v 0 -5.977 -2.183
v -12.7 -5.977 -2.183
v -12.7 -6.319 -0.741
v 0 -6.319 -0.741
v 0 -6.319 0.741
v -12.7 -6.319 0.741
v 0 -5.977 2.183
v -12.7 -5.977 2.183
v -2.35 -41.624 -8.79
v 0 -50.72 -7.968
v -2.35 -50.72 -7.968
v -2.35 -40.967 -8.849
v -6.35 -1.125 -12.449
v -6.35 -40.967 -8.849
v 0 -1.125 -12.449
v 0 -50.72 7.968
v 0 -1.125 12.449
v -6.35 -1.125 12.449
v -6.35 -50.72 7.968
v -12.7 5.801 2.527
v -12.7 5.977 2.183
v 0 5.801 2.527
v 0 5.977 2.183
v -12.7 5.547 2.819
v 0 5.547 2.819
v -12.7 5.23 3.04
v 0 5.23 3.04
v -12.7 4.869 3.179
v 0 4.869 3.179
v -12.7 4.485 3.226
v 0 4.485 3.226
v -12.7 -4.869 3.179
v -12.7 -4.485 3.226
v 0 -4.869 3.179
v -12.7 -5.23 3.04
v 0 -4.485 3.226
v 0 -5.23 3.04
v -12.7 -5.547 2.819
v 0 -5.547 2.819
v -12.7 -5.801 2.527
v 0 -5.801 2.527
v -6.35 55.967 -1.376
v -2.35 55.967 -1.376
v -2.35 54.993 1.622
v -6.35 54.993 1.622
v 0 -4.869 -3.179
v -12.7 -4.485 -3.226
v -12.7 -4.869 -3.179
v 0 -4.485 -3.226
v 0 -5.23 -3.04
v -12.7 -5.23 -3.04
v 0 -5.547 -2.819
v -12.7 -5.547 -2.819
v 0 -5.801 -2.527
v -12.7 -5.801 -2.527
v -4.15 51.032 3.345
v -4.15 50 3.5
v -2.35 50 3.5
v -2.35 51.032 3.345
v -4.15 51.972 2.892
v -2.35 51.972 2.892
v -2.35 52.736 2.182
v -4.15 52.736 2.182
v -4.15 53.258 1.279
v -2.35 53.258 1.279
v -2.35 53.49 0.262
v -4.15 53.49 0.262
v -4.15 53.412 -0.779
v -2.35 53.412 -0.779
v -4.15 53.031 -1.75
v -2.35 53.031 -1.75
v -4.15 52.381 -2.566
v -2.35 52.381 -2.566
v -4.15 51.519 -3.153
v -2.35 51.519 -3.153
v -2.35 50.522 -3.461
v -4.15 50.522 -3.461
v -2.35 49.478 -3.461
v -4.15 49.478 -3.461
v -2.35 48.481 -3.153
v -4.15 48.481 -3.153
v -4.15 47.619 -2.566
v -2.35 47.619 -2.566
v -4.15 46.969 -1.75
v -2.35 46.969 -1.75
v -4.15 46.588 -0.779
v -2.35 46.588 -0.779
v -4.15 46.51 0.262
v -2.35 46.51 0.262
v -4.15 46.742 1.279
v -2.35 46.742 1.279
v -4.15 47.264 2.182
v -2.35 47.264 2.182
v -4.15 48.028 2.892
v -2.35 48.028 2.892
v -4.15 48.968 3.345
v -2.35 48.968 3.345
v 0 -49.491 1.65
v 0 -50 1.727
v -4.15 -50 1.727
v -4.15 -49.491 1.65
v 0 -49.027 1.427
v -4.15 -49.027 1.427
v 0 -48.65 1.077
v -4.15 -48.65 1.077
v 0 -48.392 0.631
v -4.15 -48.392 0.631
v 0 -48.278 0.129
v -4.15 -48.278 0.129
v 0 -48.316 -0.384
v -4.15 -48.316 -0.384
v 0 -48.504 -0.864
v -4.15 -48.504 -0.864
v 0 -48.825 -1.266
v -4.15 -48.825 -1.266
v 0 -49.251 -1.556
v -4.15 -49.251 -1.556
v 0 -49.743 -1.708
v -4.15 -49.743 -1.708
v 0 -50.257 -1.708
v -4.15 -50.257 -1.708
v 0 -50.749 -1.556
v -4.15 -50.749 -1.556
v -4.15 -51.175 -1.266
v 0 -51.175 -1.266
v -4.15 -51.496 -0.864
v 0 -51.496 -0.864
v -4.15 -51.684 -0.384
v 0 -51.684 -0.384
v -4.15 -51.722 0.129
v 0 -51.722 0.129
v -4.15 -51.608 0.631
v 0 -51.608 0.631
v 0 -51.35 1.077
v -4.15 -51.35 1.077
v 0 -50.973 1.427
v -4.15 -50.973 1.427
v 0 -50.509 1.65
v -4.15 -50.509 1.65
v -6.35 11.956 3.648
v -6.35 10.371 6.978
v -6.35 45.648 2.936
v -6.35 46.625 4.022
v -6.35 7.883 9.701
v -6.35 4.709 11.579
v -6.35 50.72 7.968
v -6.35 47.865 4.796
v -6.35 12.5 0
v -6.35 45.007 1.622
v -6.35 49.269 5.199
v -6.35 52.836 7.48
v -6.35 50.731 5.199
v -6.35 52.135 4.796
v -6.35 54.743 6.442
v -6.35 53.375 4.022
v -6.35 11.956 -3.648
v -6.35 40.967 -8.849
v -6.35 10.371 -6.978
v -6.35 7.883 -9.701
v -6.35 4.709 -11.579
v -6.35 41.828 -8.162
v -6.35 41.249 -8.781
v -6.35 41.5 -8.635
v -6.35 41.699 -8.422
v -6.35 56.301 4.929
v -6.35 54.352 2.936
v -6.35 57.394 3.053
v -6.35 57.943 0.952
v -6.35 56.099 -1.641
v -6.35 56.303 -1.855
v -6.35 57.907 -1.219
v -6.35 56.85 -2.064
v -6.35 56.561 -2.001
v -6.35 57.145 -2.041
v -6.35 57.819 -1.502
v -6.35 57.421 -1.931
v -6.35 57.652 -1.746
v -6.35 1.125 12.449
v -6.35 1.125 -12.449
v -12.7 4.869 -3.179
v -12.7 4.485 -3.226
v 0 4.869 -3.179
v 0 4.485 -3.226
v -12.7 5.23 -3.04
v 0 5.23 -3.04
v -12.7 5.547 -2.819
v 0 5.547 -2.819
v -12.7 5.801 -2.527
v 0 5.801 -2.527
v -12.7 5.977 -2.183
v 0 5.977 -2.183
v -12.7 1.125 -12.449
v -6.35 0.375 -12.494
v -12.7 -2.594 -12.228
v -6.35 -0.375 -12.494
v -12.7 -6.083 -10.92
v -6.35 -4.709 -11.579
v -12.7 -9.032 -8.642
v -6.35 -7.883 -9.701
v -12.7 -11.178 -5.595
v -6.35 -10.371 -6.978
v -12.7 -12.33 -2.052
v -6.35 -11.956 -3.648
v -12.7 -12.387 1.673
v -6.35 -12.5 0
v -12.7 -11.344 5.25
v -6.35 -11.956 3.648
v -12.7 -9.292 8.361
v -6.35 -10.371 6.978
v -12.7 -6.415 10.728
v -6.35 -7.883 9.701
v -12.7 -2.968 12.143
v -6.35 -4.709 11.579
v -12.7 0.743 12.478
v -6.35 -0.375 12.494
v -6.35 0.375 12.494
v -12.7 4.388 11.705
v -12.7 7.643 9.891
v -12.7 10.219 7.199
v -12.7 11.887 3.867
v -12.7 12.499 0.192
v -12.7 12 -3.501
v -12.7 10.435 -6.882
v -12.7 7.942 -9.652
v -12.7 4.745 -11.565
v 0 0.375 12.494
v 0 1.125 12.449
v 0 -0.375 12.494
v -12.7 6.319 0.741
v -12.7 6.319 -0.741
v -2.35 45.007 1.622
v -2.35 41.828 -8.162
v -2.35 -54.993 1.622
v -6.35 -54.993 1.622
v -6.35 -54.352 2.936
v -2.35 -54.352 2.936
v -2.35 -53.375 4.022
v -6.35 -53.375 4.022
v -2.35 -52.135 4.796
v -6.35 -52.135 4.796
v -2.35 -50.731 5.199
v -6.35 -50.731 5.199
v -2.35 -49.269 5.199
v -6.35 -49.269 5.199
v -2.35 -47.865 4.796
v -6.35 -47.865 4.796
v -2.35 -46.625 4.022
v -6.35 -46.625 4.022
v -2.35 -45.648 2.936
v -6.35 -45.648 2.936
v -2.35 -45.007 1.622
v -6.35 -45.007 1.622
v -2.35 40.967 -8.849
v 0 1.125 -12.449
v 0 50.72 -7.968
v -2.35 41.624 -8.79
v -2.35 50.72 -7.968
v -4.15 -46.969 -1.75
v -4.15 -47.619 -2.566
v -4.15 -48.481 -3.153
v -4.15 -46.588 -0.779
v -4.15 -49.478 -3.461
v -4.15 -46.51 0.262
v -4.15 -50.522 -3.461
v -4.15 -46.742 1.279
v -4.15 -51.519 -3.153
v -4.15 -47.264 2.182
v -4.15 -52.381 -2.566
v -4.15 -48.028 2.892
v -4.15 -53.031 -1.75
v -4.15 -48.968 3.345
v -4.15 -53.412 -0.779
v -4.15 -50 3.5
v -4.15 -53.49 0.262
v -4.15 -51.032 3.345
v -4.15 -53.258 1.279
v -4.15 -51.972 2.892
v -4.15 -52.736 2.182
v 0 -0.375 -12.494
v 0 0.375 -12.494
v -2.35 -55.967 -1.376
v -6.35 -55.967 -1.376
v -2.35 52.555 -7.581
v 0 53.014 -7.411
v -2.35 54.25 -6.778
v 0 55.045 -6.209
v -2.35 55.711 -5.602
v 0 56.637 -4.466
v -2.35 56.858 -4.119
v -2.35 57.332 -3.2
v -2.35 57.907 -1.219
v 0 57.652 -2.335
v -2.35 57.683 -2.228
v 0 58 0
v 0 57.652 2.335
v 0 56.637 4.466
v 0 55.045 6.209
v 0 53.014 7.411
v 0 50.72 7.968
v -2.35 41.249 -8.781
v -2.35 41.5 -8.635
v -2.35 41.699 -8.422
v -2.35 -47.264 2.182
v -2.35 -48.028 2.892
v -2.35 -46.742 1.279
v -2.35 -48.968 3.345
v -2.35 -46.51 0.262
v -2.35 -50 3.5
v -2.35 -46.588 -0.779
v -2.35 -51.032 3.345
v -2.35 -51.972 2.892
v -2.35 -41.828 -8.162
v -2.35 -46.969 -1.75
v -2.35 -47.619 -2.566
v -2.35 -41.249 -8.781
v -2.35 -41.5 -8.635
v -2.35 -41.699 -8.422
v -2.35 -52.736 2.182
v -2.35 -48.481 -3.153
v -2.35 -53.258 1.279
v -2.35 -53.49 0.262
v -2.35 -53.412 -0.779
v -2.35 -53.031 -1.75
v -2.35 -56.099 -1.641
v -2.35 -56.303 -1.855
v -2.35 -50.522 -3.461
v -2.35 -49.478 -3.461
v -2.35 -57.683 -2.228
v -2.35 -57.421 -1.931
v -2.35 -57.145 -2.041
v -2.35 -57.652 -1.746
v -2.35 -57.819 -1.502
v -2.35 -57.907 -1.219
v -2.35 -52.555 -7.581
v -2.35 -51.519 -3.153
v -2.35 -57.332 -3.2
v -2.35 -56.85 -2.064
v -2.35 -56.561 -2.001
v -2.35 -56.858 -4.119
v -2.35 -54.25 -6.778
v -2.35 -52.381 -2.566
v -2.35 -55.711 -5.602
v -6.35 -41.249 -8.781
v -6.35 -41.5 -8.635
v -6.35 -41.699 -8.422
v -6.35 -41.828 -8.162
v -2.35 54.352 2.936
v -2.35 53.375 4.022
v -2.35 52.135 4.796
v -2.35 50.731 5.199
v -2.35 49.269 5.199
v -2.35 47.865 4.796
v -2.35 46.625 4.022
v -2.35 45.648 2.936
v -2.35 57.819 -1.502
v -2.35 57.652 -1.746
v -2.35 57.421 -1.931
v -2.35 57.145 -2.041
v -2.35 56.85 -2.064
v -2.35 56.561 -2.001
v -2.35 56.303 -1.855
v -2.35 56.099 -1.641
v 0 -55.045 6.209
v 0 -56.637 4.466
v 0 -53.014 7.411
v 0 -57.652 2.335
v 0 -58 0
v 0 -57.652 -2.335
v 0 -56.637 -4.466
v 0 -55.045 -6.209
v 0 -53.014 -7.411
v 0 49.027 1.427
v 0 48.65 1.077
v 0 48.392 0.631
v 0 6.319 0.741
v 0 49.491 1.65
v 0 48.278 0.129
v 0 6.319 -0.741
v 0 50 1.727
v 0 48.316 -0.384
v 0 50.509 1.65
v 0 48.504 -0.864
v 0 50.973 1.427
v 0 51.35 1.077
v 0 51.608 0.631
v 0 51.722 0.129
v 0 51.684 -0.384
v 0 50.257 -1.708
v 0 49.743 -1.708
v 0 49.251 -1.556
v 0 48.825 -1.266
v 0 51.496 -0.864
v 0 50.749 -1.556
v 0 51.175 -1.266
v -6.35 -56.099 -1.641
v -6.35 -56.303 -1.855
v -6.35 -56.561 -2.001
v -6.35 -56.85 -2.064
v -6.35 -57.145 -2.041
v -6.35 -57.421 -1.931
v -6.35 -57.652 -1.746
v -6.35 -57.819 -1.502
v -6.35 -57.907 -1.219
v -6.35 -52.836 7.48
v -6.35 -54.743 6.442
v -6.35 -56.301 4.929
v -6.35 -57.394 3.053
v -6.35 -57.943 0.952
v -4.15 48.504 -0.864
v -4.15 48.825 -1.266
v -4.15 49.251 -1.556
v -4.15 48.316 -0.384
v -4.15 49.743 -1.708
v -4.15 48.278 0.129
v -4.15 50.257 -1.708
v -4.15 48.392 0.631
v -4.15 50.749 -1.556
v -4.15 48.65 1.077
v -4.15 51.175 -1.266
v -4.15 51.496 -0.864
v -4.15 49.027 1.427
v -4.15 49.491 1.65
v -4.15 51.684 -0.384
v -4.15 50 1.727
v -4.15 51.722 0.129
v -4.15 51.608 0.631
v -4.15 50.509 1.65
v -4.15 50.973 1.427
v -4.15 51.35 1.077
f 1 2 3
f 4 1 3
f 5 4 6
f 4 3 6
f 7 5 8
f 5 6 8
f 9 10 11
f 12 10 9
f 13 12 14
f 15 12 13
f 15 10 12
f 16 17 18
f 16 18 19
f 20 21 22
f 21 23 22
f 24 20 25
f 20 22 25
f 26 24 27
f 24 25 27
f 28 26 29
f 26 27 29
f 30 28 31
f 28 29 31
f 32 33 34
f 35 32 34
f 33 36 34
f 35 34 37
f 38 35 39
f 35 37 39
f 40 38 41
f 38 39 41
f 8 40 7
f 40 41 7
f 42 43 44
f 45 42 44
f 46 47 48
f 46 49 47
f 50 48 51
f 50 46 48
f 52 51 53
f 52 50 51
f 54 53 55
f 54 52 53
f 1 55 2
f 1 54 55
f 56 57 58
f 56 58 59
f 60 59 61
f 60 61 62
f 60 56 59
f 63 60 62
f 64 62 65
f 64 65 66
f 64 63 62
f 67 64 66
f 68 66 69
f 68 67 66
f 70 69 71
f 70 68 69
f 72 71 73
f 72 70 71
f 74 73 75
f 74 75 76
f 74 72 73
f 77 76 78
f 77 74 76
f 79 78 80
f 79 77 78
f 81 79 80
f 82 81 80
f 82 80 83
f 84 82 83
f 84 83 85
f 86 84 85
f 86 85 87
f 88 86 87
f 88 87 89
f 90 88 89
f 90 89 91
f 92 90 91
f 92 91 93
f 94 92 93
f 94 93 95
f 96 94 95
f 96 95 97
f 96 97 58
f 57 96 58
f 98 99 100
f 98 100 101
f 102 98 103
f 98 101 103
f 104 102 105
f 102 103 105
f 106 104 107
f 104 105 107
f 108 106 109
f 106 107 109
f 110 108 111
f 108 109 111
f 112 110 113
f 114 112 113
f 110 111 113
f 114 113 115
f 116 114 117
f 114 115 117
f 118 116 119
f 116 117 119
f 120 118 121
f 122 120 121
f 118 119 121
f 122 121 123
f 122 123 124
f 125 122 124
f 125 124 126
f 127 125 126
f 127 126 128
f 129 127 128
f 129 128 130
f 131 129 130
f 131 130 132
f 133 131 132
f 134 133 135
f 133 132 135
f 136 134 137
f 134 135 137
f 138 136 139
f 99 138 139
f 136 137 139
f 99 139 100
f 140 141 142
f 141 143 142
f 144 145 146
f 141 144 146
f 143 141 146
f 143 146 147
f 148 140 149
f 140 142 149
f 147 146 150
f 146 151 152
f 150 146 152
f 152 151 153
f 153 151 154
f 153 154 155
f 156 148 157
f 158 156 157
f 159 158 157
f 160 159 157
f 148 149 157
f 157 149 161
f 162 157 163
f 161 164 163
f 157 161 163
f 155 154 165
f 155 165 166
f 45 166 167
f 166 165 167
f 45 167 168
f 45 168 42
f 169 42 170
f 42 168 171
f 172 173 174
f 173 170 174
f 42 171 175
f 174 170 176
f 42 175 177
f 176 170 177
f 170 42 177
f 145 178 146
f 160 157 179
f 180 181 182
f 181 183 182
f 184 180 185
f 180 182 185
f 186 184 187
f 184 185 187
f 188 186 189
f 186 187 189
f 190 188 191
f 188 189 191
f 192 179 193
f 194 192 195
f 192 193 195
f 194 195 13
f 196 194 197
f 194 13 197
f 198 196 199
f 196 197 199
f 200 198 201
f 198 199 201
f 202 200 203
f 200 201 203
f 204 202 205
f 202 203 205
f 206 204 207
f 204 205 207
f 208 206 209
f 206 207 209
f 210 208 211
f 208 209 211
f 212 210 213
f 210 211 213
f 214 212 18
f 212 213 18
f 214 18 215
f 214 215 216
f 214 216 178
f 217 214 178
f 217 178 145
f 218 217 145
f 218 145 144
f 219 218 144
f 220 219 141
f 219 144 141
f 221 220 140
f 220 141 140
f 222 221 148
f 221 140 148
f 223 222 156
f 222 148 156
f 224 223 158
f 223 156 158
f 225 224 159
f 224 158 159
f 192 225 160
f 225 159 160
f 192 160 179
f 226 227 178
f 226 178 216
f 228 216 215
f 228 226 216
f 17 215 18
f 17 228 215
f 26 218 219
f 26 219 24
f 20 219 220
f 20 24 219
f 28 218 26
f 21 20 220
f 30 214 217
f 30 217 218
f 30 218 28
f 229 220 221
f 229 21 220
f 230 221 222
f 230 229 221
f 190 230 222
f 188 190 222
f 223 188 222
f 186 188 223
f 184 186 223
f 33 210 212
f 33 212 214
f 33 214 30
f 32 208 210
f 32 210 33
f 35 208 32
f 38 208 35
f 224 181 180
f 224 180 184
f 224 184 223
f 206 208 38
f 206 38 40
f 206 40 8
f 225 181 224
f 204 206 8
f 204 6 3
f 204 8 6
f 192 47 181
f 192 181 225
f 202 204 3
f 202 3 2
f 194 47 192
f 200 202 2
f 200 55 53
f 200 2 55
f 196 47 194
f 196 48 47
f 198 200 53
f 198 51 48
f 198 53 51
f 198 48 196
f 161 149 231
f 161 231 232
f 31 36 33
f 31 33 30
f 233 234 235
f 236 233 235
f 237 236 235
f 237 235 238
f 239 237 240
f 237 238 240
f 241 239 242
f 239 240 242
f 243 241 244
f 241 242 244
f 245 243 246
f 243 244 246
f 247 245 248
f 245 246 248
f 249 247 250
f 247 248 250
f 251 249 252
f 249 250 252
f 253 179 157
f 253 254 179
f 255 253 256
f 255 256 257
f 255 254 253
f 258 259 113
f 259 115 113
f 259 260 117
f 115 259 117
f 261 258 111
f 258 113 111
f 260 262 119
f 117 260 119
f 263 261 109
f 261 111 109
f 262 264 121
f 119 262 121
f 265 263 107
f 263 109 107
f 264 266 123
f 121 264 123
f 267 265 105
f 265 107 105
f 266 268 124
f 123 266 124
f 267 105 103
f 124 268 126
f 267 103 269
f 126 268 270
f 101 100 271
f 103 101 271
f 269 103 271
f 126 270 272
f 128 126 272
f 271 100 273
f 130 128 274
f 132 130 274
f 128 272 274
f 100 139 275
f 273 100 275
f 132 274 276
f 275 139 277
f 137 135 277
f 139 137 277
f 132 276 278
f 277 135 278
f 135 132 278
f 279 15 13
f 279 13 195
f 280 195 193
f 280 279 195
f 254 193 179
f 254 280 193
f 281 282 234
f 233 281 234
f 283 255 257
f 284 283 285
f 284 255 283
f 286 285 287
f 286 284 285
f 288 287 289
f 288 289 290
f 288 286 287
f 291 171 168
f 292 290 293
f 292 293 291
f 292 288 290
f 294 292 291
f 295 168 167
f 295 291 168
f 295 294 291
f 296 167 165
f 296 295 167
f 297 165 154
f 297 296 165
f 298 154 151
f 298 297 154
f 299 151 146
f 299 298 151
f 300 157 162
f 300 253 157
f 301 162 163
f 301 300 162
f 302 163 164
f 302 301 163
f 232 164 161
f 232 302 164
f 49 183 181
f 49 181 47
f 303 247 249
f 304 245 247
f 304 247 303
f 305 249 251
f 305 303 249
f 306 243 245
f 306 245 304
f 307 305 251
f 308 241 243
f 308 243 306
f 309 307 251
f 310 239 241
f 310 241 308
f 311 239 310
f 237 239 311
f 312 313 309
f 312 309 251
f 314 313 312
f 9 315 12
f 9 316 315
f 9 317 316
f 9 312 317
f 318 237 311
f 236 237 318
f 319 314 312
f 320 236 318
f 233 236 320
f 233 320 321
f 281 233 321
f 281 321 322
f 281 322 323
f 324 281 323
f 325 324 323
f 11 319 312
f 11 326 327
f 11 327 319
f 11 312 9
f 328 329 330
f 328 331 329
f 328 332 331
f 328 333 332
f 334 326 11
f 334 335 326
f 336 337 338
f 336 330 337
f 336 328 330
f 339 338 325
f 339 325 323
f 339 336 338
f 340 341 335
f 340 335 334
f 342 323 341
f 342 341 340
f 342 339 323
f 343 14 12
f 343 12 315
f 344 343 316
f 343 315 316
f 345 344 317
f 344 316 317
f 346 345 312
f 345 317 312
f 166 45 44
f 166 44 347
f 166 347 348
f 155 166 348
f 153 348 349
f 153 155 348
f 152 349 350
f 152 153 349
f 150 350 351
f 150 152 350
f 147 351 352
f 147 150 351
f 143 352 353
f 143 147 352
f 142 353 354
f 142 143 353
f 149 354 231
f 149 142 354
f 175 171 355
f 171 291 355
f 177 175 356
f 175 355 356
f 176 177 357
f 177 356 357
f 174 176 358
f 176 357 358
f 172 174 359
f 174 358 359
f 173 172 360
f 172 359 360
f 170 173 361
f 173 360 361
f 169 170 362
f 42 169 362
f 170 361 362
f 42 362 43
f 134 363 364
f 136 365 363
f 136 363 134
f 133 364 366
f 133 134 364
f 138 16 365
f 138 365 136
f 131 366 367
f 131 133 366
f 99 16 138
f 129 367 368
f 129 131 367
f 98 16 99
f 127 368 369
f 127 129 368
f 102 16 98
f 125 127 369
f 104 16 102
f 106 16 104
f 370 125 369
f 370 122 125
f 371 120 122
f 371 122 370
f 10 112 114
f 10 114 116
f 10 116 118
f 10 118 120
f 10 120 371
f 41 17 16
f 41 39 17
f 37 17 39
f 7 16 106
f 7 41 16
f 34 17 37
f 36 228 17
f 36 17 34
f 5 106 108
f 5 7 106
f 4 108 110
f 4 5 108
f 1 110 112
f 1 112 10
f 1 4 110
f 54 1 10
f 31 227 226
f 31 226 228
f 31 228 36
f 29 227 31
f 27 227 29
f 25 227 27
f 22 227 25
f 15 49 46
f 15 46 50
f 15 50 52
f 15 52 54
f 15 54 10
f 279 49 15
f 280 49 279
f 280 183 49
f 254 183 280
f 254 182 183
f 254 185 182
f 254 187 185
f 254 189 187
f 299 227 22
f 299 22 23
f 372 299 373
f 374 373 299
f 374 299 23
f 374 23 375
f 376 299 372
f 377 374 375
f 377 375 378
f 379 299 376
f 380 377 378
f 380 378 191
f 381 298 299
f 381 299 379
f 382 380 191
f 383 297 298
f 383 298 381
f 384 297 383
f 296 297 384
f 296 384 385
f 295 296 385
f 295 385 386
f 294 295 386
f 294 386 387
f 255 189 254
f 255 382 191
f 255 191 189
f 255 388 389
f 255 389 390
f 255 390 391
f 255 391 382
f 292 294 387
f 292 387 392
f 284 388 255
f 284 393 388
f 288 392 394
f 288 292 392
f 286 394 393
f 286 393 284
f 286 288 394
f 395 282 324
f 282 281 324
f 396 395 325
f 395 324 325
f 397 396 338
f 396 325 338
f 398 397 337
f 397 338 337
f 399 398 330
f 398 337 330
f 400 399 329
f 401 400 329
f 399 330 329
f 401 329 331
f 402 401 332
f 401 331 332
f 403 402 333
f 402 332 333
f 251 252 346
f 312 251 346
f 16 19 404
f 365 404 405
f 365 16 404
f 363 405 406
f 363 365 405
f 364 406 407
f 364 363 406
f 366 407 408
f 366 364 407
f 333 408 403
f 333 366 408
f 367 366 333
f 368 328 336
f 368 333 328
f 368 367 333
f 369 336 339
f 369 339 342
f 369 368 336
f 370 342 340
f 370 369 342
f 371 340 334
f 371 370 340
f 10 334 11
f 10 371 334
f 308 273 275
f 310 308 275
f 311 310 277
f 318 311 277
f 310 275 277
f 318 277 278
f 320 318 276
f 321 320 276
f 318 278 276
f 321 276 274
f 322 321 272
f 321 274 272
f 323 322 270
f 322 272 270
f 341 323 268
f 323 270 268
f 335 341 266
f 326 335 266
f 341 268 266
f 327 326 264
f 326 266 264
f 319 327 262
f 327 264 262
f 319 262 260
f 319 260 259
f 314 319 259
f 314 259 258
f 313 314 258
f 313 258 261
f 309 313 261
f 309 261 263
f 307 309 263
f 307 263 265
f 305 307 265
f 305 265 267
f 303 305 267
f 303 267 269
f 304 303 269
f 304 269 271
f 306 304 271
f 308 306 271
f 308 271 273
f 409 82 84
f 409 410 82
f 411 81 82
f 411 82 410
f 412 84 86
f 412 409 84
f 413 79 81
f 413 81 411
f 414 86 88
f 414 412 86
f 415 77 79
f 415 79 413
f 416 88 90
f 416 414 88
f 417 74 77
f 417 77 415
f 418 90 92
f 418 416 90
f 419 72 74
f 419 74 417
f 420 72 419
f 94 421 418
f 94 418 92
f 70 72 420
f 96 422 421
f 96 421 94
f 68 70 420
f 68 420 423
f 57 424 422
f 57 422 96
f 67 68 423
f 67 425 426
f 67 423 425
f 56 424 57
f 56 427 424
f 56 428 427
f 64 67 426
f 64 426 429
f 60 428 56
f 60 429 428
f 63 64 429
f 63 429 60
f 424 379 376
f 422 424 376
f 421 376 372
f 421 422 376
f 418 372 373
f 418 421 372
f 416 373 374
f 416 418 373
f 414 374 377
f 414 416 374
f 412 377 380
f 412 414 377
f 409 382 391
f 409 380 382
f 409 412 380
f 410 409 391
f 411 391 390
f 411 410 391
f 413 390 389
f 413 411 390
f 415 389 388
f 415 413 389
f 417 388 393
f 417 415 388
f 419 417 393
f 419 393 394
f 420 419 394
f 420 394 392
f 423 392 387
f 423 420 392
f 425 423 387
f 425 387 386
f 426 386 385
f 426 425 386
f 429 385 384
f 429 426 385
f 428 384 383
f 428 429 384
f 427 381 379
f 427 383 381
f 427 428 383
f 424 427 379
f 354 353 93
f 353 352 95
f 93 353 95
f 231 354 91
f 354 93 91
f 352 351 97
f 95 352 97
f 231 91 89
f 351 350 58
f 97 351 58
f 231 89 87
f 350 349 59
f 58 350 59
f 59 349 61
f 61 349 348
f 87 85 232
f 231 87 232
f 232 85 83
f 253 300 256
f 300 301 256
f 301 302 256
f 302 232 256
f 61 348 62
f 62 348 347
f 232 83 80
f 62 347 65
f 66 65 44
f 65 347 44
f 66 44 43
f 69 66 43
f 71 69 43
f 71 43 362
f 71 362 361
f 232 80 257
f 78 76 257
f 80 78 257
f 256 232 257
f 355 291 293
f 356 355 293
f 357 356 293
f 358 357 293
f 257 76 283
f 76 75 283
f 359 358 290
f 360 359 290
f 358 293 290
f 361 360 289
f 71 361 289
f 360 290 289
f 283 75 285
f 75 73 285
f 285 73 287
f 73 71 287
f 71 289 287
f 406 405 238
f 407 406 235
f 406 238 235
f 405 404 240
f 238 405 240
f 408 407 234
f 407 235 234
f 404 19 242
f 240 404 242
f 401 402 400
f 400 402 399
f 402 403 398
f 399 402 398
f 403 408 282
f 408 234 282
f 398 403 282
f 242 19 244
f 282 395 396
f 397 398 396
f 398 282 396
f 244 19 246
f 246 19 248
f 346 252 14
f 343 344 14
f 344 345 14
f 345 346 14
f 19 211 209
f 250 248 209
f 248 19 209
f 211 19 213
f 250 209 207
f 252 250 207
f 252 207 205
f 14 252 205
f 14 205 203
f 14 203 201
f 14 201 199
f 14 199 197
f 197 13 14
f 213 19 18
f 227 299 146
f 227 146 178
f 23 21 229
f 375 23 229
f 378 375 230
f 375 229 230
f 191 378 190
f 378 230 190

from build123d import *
from build123d.topology import SkipClean

# Parameters (mm, degrees)
BOSS_EXTRUDE1_DEPTH = 6.35
SKETCH3_R           = 3.5
CUT_EXTRUDE1_DEPTH  = 4
FILLET1_R           = 1
SKETCH4_R           = 12.5
BOSS_EXTRUDE2_DEPTH = 6.35
CUT_EXTRUDE2_DEPTH  = 13.7
FILLET2_R           = 1
FILLET3_R           = 1.5875
SKETCH9_R           = 3.5
CUT_EXTRUDE3_DEPTH  = 2.2


with BuildPart() as part:
    # Sketch2 → Boss-Extrude1 (new body)
    with BuildSketch(Plane(origin=(0, 0, 0), x_dir=(0, 0, -1), z_dir=(1, 0, 0))):
        with BuildLine():
            Line((-12.449272067, -1.125), (-7.967534123, -50.72))
            ThreePointArc((-7.967534123, -50.72), (0, -58), (7.967534123, -50.72))
            Line((7.967534123, -50.72), (12.449272067, -1.125))
            ThreePointArc((12.449272067, -1.125), (12.5, 0), (12.449272067, 1.125))
            Line((12.449272067, 1.125), (7.967534123, 50.72))
            ThreePointArc((7.967534123, 50.72), (0, 58), (-7.967534123, 50.72))
            Line((-7.967534123, 50.72), (-12.449272067, 1.125))
            ThreePointArc((-12.449272067, 1.125), (-12.5, 0), (-12.449272067, -1.125))
        make_face()
    extrude(amount=-BOSS_EXTRUDE1_DEPTH)

    # Sketch3 → Cut-Extrude1 (cut)
    with BuildSketch(Plane.ZY.offset(6.35)):
        with BuildLine():
            Line((-4.118569102, 56.858380899), (1.62233922, 54.993046711))
            ThreePointArc((1.62233922, 54.993046711), (5.25, 50), (1.62233922, 45.006953289))
            Line((1.62233922, 45.006953289), (-8.789515625, 41.623936576))
            Line((-8.789515625, 41.623936576), (-7.967534123, 50.72))
            ThreePointArc((-7.967534123, 50.72), (-6.777787456, 54.249893786), (-4.118569102, 56.858380899))
        make_face()
        with Locations((0, 50)):
            Circle(SKETCH3_R, mode=Mode.SUBTRACT)
    cut_extrude1 = extrude(amount=-CUT_EXTRUDE1_DEPTH, mode=Mode.SUBTRACT)

    # Fillet1
    fillet1_edges = [part.edges().sort_by_distance(p)[0] for p in [
        (-4.35, 56.858380899, -4.118569102),
        (-4.35, 41.623936576, -8.789515625),
    ]]
    fillet(fillet1_edges, radius=FILLET1_R)

    # Mirror1: Cut-Extrude1 across plane
    add(cut_extrude1.mirror(Plane.ZX), mode=Mode.SUBTRACT)

    # Sketch4 → Boss-Extrude2 (add)
    with SkipClean():  # keep this step's faces unmerged: merging them makes the solid invalid here
        with BuildSketch(Plane.ZY.offset(6.35)):
            with Locations(Location((0, 0, 0), (0, 0, 174.836392909))):  # turned: the seam where the file's is
                Circle(SKETCH4_R)
        extrude(amount=BOSS_EXTRUDE2_DEPTH)

    # Sketch5 → Cut-Extrude2 (cut, through all)
    with SkipClean():  # keep this step's faces unmerged: merging them makes the solid invalid here
        with BuildSketch(Plane.ZY.offset(12.7)):
            with BuildLine():
                Line((-3.2258, 5.484356448), (-3.2258, -5.484356448))
                ThreePointArc((-3.2258, -5.484356448), (0, -6.3627), (3.2258, -5.484356448))
                Line((3.2258, -5.484356448), (3.2258, 5.484356448))
                ThreePointArc((3.2258, 5.484356448), (0, 6.3627), (-3.2258, 5.484356448))
            make_face()
        extrude(amount=-CUT_EXTRUDE2_DEPTH, mode=Mode.SUBTRACT)

    # Fillet2
    fillet2_edges = [part.edges().sort_by_distance(p)[0] for p in [
        (-4.35, -56.858380899, -4.118569102),
        (-4.35, -41.623936576, -8.789515625),
    ]]
    fillet(fillet2_edges, radius=FILLET2_R)

    # Fillet3
    fillet3_edges = [part.edges().sort_by_distance(p)[0] for p in [
        (-6.35, 5.484356448, -3.2258),
        (-6.35, 5.484356448, 3.2258),
        (-6.35, -5.484356448, 3.2258),
        (-6.35, -5.484356448, -3.2258),
    ]]
    fillet(fillet3_edges, radius=FILLET3_R)

    # Sketch9 → Cut-Extrude3 (cut)
    with SkipClean():  # keep this step's faces unmerged: merging them makes the solid invalid here
        with BuildSketch(Plane.ZY.offset(6.35)):
            with Locations((0, 50)):
                Circle(SKETCH9_R)
        cut_extrude3 = extrude(amount=-CUT_EXTRUDE3_DEPTH, mode=Mode.SUBTRACT)

    # Sketch7 → #8-32 Tapped Hole1 (revolve, cut)
    with SkipClean():  # keep this step's faces unmerged: merging them makes the solid invalid here
        with BuildSketch(Plane(origin=(-6.35, 50, 0), x_dir=(0, 0, 1), z_dir=(0, 1, 0))):
            Polygon((0, 0), (0, 13.327806461), (1.7272, 12.29), (1.7272, 0), align=None)
        f_8_32_tapped_hole1 = revolve(axis=Axis((-12.7, 50, 0), (1, 0, 0)), mode=Mode.SUBTRACT)

    # Mirror2: Cut-Extrude3, #8-32 Tapped Hole1 across plane
    with SkipClean():  # keep this step's faces unmerged: merging them makes the solid invalid here
        add(cut_extrude3.mirror(Plane.ZX), mode=Mode.SUBTRACT)
        add(f_8_32_tapped_hole1.mirror(Plane.ZX), mode=Mode.SUBTRACT)


solid = part.part
